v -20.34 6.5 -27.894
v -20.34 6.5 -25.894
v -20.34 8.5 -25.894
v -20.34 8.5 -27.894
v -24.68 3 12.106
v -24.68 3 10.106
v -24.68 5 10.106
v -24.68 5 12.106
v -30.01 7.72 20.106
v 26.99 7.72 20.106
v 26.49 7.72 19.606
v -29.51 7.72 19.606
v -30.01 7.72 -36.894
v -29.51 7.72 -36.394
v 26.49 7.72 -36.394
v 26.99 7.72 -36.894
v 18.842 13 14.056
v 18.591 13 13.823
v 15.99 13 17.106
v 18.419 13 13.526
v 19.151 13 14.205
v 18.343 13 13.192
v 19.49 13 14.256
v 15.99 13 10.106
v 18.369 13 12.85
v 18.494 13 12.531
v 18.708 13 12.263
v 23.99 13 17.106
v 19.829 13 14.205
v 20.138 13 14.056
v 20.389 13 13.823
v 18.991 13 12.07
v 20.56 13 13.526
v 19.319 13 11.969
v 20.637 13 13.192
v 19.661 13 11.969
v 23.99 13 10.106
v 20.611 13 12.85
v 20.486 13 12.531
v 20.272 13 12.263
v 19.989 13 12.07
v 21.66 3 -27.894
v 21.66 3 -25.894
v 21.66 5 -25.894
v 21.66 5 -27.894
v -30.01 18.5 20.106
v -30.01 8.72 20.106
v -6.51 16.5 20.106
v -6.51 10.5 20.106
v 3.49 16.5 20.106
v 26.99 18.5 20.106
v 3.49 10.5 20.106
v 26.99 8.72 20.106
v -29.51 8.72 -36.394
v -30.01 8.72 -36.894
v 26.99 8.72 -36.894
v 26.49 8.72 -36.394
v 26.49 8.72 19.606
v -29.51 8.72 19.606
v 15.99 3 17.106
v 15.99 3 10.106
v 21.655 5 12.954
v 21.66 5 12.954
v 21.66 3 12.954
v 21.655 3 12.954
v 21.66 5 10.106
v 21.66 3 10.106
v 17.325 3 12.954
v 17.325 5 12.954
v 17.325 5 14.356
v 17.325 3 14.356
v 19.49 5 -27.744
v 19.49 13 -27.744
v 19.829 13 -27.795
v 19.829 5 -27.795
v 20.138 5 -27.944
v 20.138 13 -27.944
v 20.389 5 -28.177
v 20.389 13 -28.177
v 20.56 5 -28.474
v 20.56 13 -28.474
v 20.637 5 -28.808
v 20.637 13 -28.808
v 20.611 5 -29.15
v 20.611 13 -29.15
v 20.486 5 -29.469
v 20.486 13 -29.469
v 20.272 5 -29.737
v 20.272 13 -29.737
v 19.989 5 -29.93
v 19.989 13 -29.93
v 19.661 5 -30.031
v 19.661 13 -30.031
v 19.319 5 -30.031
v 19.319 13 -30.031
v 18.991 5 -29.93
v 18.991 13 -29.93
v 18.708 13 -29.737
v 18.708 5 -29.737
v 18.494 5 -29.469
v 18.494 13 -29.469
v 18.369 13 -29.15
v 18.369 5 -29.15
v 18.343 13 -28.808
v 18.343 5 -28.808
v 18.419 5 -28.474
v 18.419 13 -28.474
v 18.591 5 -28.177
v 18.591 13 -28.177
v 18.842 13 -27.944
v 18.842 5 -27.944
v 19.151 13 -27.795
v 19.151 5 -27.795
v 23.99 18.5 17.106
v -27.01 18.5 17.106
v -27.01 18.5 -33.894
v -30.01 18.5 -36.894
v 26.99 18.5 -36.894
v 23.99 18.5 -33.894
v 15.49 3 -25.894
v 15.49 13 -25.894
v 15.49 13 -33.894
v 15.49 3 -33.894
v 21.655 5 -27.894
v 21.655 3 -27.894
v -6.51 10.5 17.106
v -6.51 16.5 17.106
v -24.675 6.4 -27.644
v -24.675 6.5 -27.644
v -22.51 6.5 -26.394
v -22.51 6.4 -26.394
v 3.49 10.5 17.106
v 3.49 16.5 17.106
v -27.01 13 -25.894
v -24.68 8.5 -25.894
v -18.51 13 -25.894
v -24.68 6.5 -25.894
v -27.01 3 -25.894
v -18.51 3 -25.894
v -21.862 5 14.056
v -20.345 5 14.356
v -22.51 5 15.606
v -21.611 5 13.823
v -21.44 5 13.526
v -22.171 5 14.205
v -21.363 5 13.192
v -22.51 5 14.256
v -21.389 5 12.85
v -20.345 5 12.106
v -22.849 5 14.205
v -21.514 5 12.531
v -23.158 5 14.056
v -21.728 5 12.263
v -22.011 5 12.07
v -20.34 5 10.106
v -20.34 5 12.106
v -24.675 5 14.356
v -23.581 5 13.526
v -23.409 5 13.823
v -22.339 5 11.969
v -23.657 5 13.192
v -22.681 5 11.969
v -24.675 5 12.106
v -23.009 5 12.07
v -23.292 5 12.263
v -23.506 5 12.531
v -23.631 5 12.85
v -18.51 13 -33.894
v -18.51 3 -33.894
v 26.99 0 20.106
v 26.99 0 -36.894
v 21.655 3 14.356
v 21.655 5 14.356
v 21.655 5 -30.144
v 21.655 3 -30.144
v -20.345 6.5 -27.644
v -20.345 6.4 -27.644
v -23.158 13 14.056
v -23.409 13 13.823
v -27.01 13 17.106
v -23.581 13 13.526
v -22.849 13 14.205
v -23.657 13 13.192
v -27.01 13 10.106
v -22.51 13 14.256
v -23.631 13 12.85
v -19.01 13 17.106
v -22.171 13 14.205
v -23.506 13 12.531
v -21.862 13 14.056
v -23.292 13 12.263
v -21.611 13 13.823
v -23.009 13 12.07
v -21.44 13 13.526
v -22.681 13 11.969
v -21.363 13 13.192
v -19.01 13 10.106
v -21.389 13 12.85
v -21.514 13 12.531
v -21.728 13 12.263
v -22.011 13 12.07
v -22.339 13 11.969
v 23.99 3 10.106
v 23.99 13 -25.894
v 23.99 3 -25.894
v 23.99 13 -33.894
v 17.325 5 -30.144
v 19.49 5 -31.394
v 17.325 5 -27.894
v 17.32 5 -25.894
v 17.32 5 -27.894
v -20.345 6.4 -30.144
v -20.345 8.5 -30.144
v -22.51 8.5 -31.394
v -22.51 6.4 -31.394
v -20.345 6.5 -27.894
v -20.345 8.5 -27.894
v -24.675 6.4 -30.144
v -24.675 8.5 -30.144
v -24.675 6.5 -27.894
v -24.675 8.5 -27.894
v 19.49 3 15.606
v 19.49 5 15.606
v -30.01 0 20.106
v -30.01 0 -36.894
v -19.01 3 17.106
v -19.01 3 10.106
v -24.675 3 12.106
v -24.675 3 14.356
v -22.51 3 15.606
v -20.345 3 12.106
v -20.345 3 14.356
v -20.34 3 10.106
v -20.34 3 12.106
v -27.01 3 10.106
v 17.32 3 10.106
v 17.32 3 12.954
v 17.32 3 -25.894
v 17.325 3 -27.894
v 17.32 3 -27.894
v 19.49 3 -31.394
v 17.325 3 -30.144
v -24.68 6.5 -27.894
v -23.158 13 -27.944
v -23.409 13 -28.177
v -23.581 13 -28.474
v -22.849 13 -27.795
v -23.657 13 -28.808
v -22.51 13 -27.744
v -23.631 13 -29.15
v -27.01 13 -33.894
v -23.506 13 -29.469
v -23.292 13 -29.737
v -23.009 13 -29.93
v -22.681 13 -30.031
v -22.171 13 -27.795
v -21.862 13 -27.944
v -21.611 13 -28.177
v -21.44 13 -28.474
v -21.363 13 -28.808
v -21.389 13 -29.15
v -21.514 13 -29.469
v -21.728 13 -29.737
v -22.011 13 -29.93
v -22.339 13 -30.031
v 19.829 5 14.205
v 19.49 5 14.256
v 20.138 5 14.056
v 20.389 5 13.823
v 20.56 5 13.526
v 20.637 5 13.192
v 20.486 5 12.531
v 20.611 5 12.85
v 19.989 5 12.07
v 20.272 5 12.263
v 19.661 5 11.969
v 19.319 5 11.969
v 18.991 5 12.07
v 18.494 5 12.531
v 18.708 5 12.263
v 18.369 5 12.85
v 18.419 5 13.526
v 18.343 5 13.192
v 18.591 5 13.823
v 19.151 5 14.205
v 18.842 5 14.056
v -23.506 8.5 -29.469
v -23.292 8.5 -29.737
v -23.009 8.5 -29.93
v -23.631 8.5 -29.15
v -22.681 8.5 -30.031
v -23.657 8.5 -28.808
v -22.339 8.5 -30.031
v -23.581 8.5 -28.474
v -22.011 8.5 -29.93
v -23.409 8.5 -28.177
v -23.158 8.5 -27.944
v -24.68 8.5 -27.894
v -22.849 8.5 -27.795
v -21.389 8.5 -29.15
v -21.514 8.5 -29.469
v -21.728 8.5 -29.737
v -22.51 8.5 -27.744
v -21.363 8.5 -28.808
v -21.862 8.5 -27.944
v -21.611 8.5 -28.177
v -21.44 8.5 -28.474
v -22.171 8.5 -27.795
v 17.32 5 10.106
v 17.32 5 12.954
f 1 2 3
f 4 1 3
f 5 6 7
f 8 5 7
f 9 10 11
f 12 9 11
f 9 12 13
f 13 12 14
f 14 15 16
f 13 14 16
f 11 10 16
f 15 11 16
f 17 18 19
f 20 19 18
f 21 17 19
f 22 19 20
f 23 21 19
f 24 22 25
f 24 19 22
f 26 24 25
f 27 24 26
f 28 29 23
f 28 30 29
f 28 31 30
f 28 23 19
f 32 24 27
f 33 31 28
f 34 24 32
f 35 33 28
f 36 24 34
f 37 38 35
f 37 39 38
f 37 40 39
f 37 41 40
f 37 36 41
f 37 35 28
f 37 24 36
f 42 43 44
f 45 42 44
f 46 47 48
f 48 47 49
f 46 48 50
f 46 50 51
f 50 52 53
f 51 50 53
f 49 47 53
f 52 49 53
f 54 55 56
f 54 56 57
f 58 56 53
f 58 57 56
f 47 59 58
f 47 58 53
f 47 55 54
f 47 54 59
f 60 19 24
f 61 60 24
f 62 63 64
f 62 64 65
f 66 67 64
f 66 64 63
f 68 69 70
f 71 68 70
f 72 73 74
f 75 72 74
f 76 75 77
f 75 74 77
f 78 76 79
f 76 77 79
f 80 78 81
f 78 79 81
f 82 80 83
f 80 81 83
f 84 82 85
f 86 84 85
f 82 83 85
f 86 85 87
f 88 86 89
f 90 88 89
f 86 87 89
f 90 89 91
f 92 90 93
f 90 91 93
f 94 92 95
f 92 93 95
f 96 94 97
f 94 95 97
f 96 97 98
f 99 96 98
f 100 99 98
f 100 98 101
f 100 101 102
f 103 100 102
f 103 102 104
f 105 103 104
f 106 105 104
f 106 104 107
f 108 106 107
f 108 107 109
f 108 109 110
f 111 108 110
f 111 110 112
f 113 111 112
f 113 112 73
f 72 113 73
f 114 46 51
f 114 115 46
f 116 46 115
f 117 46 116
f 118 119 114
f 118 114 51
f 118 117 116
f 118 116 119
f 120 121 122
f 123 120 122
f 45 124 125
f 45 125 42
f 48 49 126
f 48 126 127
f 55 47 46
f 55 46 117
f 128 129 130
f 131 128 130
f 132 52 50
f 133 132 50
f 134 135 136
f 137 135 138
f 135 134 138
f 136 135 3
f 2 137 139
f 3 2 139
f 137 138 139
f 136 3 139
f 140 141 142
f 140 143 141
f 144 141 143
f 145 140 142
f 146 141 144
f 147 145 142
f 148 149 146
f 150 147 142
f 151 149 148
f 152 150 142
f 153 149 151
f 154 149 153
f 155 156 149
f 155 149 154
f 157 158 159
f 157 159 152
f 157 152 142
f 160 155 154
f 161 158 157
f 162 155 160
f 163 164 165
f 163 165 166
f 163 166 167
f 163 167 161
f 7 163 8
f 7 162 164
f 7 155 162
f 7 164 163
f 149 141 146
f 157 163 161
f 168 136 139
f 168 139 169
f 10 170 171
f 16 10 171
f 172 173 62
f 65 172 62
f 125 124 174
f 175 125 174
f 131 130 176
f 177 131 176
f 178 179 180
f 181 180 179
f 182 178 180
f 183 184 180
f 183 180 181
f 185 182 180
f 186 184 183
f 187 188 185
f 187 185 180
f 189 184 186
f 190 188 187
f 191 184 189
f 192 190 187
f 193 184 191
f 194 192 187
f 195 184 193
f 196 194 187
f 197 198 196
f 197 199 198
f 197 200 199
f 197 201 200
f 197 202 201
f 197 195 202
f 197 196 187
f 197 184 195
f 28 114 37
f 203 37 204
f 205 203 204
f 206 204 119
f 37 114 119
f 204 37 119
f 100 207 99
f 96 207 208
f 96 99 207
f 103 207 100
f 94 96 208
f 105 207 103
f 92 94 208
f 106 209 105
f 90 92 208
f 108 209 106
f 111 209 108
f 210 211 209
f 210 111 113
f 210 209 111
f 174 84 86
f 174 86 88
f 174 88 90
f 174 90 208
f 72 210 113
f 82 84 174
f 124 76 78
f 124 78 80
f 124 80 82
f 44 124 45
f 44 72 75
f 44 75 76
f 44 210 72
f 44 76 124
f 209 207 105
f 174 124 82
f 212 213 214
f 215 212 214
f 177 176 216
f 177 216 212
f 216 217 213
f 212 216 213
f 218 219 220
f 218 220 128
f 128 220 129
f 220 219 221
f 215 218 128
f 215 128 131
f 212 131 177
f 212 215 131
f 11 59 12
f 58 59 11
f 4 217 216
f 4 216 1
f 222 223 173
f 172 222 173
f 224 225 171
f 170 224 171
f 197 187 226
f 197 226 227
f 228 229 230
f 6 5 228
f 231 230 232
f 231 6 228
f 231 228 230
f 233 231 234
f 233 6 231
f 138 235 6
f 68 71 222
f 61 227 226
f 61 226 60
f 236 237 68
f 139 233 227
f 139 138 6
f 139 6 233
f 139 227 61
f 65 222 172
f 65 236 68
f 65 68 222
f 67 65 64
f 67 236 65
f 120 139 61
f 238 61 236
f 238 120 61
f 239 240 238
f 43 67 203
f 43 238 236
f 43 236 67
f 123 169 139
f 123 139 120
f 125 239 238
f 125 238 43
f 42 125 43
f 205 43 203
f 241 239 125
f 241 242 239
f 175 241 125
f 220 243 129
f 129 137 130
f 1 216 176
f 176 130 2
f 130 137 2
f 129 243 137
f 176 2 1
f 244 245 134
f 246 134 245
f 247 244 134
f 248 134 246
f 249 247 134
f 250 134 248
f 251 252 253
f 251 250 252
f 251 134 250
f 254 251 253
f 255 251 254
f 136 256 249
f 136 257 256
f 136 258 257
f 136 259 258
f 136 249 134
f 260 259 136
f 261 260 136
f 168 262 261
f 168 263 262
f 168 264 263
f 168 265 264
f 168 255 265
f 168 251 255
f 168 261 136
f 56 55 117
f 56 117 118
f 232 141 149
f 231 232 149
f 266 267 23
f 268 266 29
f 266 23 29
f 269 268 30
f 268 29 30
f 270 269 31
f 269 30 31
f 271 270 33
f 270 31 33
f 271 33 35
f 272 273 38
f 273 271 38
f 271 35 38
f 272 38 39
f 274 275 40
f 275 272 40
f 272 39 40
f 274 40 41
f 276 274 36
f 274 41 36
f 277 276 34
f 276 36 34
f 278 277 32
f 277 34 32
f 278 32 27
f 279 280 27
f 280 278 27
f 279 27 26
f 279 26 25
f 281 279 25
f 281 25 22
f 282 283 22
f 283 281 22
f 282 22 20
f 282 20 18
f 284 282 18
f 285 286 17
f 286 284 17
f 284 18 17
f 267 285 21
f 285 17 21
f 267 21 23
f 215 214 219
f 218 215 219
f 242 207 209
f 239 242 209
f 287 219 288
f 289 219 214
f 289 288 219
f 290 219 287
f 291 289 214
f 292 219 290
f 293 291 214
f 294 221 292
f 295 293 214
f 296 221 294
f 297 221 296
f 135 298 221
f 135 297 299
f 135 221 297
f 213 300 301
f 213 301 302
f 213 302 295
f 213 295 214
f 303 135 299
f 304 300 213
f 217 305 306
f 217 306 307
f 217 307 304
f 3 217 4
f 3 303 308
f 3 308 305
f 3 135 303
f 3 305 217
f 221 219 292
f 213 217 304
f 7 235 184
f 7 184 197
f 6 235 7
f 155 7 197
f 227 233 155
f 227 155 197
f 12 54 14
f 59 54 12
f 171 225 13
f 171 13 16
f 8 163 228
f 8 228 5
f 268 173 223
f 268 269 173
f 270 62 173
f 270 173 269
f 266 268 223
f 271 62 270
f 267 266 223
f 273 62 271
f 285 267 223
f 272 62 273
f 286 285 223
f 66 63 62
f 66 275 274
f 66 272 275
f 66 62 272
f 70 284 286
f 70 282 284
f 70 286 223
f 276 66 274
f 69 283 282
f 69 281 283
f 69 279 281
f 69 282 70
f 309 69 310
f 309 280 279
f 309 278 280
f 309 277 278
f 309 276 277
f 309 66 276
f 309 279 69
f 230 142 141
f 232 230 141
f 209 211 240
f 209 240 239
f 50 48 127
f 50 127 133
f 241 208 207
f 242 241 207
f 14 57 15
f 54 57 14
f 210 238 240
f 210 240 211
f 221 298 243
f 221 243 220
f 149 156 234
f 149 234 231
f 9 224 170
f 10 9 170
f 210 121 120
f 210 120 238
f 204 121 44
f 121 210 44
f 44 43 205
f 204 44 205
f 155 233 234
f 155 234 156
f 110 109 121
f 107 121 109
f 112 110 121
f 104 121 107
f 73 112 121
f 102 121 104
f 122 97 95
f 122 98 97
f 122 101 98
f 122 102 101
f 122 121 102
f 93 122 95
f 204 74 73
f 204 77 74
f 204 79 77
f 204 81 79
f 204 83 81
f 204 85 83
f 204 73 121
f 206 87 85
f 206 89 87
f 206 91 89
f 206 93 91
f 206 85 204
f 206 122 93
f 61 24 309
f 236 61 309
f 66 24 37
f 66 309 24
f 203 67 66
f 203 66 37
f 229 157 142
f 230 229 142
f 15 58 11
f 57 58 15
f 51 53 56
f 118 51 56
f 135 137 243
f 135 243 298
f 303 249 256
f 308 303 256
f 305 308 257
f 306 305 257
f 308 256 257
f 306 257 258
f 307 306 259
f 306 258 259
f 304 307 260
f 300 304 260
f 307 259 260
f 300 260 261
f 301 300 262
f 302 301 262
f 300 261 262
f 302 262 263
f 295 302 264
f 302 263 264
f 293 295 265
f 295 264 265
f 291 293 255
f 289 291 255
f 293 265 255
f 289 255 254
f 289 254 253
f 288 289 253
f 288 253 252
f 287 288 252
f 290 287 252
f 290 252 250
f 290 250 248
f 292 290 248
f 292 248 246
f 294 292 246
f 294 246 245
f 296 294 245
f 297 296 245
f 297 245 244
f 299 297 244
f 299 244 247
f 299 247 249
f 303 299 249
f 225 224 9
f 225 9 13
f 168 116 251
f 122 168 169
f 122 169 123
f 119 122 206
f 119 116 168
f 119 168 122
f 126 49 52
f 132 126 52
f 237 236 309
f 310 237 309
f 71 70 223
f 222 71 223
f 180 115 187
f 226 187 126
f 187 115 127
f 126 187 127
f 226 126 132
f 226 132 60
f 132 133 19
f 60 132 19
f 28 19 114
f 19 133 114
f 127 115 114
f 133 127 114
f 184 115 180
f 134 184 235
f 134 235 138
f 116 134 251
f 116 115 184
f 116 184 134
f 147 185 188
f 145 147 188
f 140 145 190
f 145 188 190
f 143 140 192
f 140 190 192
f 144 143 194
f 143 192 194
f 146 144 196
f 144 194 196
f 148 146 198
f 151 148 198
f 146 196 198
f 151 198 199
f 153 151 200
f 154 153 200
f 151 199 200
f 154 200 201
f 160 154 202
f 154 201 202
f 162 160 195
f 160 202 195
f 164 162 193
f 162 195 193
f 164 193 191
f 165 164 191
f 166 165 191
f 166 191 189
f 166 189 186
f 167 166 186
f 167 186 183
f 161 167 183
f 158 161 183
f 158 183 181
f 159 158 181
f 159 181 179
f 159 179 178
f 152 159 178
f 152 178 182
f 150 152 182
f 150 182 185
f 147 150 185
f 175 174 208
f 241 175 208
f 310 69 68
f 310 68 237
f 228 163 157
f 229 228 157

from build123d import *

# Parameters (mm, degrees)
ESQUISSE1_W              = 57
ESQUISSE1_H              = 57
BOSS_EXTRU_1_DEPTH       = 18.5
ESQUISSE2_W              = 51
ESQUISSE2_H              = 51
ENL_V_MAT_EXTRU_1_DEPTH  = 15.5
ESQUISSE4_W              = 8.5
ESQUISSE4_H              = 8
BOSS_EXTRU_2_DEPTH       = 10
ESQUISSE5_W              = 8.5
ESQUISSE5_H              = 8
BOSS_EXTRU_3_DEPTH       = 10
ESQUISSE6_W              = 8
ESQUISSE6_H              = 7
BOSS_EXTRU_4_DEPTH       = 10
ESQUISSE7_W              = 8
ESQUISSE7_H              = 7
BOSS_EXTRU_5_DEPTH       = 10
ESQUISSE8_R              = 1.15
ENL_V_MAT_EXTRU_2_DEPTH  = 10
ESQUISSE9_R              = 1.15
ENL_V_MAT_EXTRU_3_DEPTH  = 10
ESQUISSE16_R             = 1.15
ENL_V_MAT_EXTRU_9_DEPTH  = 6.6
ESQUISSE17_R             = 1.15
ENL_V_MAT_EXTRU_10_DEPTH = 10
ESQUISSE21_W             = 10
ESQUISSE21_H             = 6
ENL_V_MAT_EXTRU_14_DEPTH = 3
ENL_V_START              = -8
ENL_V_MAT_EXTRU_18_DEPTH = 2
ENL_V_MAT_EXTRU_20_DEPTH = 2
ESQUISSE26_W             = 4.34
ESQUISSE26_H             = 2
ENL_V_MAT_EXTRU_21_DEPTH = 2.847955181
ENL_V_START_2            = -4.5
ENL_V_MAT_EXTRU_22_DEPTH = 2.1
ENL_V_MAT_EXTRU_24_DEPTH = 2
ESQUISSE23_W             = 4.34
ESQUISSE23_H             = 2
ENL_V_MAT_EXTRU_26_DEPTH = 2
ESQUISSE31_W             = 4.34
ESQUISSE31_H             = 2
ENL_V_MAT_EXTRU_27_DEPTH = 2
ESQUISSE30_W             = 4.34
ESQUISSE30_H             = 2
ENL_V_MAT_EXTRU_28_DEPTH = 2
ESQUISSE32_W             = 57
ESQUISSE32_H             = 1
ENL_V_MAT_EXTRU_29_DEPTH = 0.5
ESQUISSE33_W             = 57
ESQUISSE33_H             = 1
ENL_V_MAT_EXTRU_30_DEPTH = 0.5
ESQUISSE34_W             = 57
ESQUISSE34_H             = 1
ENL_V_MAT_EXTRU_31_DEPTH = 0.5
ESQUISSE35_W             = 57
ESQUISSE35_H             = 1
ENL_V_MAT_EXTRU_32_DEPTH = 0.5


with BuildPart() as part:
    # Esquisse1 → Boss.-Extru.1 (new body)
    with BuildSketch(Plane(origin=(0, 0, 0), x_dir=(1, 0, 0), z_dir=(0, 1, 0))):
        with Locations((-1.510072399, 8.394175698)):
            Rectangle(ESQUISSE1_W, ESQUISSE1_H)
    extrude(amount=BOSS_EXTRU_1_DEPTH)

    # Esquisse2 → Enlèv. mat.-Extru.1 (cut)
    with BuildSketch(Plane(origin=(0, 18.5, 0), x_dir=(1, 0, 0), z_dir=(0, 1, 0))):
        with Locations((-1.510072399, 8.394175698)):
            Rectangle(ESQUISSE2_W, ESQUISSE2_H)
    extrude(amount=-ENL_V_MAT_EXTRU_1_DEPTH, mode=Mode.SUBTRACT)

    # Esquisse4 → Boss.-Extru.2 (add)
    with BuildSketch(Plane(origin=(0, 3, 0), x_dir=(1, 0, 0), z_dir=(0, 1, 0))):
        with Locations((-22.760072399, 29.894175698)):
            Rectangle(ESQUISSE4_W, ESQUISSE4_H)
    extrude(amount=BOSS_EXTRU_2_DEPTH)

    # Esquisse5 → Boss.-Extru.3 (add)
    with BuildSketch(Plane(origin=(0, 3, 0), x_dir=(1, 0, 0), z_dir=(0, 1, 0))):
        with Locations((19.739927601, 29.894175698)):
            Rectangle(ESQUISSE5_W, ESQUISSE5_H)
    extrude(amount=BOSS_EXTRU_3_DEPTH)

    # Esquisse6 → Boss.-Extru.4 (add)
    with BuildSketch(Plane(origin=(0, 3, 0), x_dir=(1, 0, 0), z_dir=(0, 1, 0))):
        with Locations((19.989927601, -13.605824302)):
            Rectangle(ESQUISSE6_W, ESQUISSE6_H)
    extrude(amount=BOSS_EXTRU_4_DEPTH)

    # Esquisse7 → Boss.-Extru.5 (add)
    with BuildSketch(Plane(origin=(0, 3, 0), x_dir=(1, 0, 0), z_dir=(0, 1, 0))):
        with Locations((-23.010072399, -13.605824302)):
            Rectangle(ESQUISSE7_W, ESQUISSE7_H)
    extrude(amount=BOSS_EXTRU_5_DEPTH)

    # Esquisse8 → Enlèv. mat.-Extru.2 (cut)
    with BuildSketch(Plane(origin=(0, 13, 0), x_dir=(1, 0, 0), z_dir=(0, 1, 0))):
        with Locations(Location((19.489927601, -13.105824302, 0), (0, 0, 270))):
            Circle(ESQUISSE8_R)
    extrude(amount=-ENL_V_MAT_EXTRU_2_DEPTH, mode=Mode.SUBTRACT)

    # Esquisse9 → Enlèv. mat.-Extru.3 (cut)
    with BuildSketch(Plane(origin=(0, 13, 0), x_dir=(1, 0, 0), z_dir=(0, 1, 0))):
        with Locations(Location((-22.510072399, -13.105824302, 0), (0, 0, 270))):
            Circle(ESQUISSE9_R)
    extrude(amount=-ENL_V_MAT_EXTRU_3_DEPTH, mode=Mode.SUBTRACT)

    # Esquisse16 → Enlèv. mat.-Extru.9 (cut)
    with BuildSketch(Plane(origin=(0, 13, 0), x_dir=(1, 0, 0), z_dir=(0, 1, 0))):
        with Locations(Location((-22.510072399, 28.894175698, 0), (0, 0, 270))):
            Circle(ESQUISSE16_R)
    extrude(amount=-ENL_V_MAT_EXTRU_9_DEPTH, mode=Mode.SUBTRACT)

    # Esquisse17 → Enlèv. mat.-Extru.10 (cut)
    with BuildSketch(Plane(origin=(0, 13, 0), x_dir=(1, 0, 0), z_dir=(0, 1, 0))):
        with Locations(Location((19.489927601, 28.894175698, 0), (0, 0, 270))):
            Circle(ESQUISSE17_R)
    extrude(amount=-ENL_V_MAT_EXTRU_10_DEPTH, mode=Mode.SUBTRACT)

    # Esquisse21 → Enlèv. mat.-Extru.14 (cut)
    with BuildSketch(Plane.XY.offset(20.105824302)):
        with Locations((-1.510072399, 13.5)):
            Rectangle(ESQUISSE21_W, ESQUISSE21_H)
    extrude(amount=-ENL_V_MAT_EXTRU_14_DEPTH, mode=Mode.SUBTRACT)

    # Esquisse24 → Enlèv. mat.-Extru.18 (cut)
    with BuildSketch(Plane(origin=(0, 13, 0), x_dir=(1, 0, 0), z_dir=(0, 1, 0)).offset(ENL_V_START)):
        Polygon((19.489927601, 26.394175698), (21.65499111, 27.644175698), (21.65499111, 30.144175698), (19.489927601, 31.394175698), (17.324864091, 30.144175698), (17.324864091, 27.644175698), align=None)
    extrude(amount=-ENL_V_MAT_EXTRU_18_DEPTH, mode=Mode.SUBTRACT)

    # Esquisse25 → Enlèv. mat.-Extru.20 (cut)
    with BuildSketch(Plane(origin=(0, 13, 0), x_dir=(1, 0, 0), z_dir=(0, 1, 0)).offset(ENL_V_START)):
        Polygon((17.324864091, -11.855824302), (17.324864091, -14.355824302), (19.489927601, -15.605824302), (21.65499111, -14.355824302), (21.65499111, -11.855824302), (19.489927601, -10.605824302), align=None)
    extrude(amount=-ENL_V_MAT_EXTRU_20_DEPTH, mode=Mode.SUBTRACT)

    # Esquisse26 → Enlèv. mat.-Extru.21 (cut)
    with BuildSketch(Plane(origin=(0, 0, 10.105824302), x_dir=(-1, 0, 0), z_dir=(0, 0, -1))):
        with Locations((-19.489927601, 4)):
            Rectangle(ESQUISSE26_W, ESQUISSE26_H)
    extrude(amount=-ENL_V_MAT_EXTRU_21_DEPTH, mode=Mode.SUBTRACT)

    # Esquisse27 → Enlèv. mat.-Extru.22 (cut)
    with BuildSketch(Plane(origin=(0, 13, 0), x_dir=(1, 0, 0), z_dir=(0, 1, 0)).offset(ENL_V_START_2)):
        Polygon((-20.34500889, 27.644175698), (-20.34500889, 30.144175698), (-22.510072399, 31.394175698), (-24.675135909, 30.144175698), (-24.675135909, 27.644175698), (-22.510072399, 26.394175698), align=None)
    extrude(amount=-ENL_V_MAT_EXTRU_22_DEPTH, mode=Mode.SUBTRACT)

    # Esquisse29 → Enlèv. mat.-Extru.24 (cut)
    with BuildSketch(Plane(origin=(0, 13, 0), x_dir=(1, 0, 0), z_dir=(0, 1, 0)).offset(ENL_V_START)):
        Polygon((-20.34500889, -11.855824302), (-22.510072399, -10.605824302), (-24.675135909, -11.855824302), (-24.675135909, -14.355824302), (-22.510072399, -15.605824302), (-20.34500889, -14.355824302), align=None)
    extrude(amount=-ENL_V_MAT_EXTRU_24_DEPTH, mode=Mode.SUBTRACT)

    # Esquisse23 → Enlèv. mat.-Extru.26 (cut)
    with BuildSketch(Plane.XY.offset(-25.894175698)):
        with Locations((19.489927601, 4)):
            Rectangle(ESQUISSE23_W, ESQUISSE23_H)
    extrude(amount=-ENL_V_MAT_EXTRU_26_DEPTH, mode=Mode.SUBTRACT)

    # Esquisse31 → Enlèv. mat.-Extru.27 (cut)
    with BuildSketch(Plane.XY.offset(-25.894175698)):
        with Locations((-22.510072399, 7.5)):
            Rectangle(ESQUISSE31_W, ESQUISSE31_H)
    extrude(amount=-ENL_V_MAT_EXTRU_27_DEPTH, mode=Mode.SUBTRACT)

    # Esquisse30 → Enlèv. mat.-Extru.28 (cut)
    with BuildSketch(Plane(origin=(0, 0, 10.105824302), x_dir=(-1, 0, 0), z_dir=(0, 0, -1))):
        with Locations((22.510072399, 4)):
            Rectangle(ESQUISSE30_W, ESQUISSE30_H)
    extrude(amount=-ENL_V_MAT_EXTRU_28_DEPTH, mode=Mode.SUBTRACT)

    # Esquisse32 → Enlèv. mat.-Extru.29 (cut)
    with BuildSketch(Plane.ZY.offset(30.010072399)):
        with Locations((-8.394175698, 8.219994516)):
            Rectangle(ESQUISSE32_W, ESQUISSE32_H)
    extrude(amount=-ENL_V_MAT_EXTRU_29_DEPTH, mode=Mode.SUBTRACT)

    # Esquisse33 → Enlèv. mat.-Extru.30 (cut)
    with BuildSketch(Plane.XY.offset(20.105824302)):
        with Locations((-1.510072399, 8.219994516)):
            Rectangle(ESQUISSE33_W, ESQUISSE33_H)
    extrude(amount=-ENL_V_MAT_EXTRU_30_DEPTH, mode=Mode.SUBTRACT)

    # Esquisse34 → Enlèv. mat.-Extru.31 (cut)
    with BuildSketch(Plane(origin=(26.989927601, 0, 0), x_dir=(0, 0, -1), z_dir=(1, 0, 0))):
        with Locations((8.394175698, 8.219994516)):
            Rectangle(ESQUISSE34_W, ESQUISSE34_H)
    extrude(amount=-ENL_V_MAT_EXTRU_31_DEPTH, mode=Mode.SUBTRACT)

    # Esquisse35 → Enlèv. mat.-Extru.32 (cut)
    with BuildSketch(Plane(origin=(0, 0, -36.894175698), x_dir=(-1, 0, 0), z_dir=(0, 0, -1))):
        with Locations((1.510072399, 8.219994516)):
            Rectangle(ESQUISSE35_W, ESQUISSE35_H)
    extrude(amount=-ENL_V_MAT_EXTRU_32_DEPTH, mode=Mode.SUBTRACT)


solid = part.part
